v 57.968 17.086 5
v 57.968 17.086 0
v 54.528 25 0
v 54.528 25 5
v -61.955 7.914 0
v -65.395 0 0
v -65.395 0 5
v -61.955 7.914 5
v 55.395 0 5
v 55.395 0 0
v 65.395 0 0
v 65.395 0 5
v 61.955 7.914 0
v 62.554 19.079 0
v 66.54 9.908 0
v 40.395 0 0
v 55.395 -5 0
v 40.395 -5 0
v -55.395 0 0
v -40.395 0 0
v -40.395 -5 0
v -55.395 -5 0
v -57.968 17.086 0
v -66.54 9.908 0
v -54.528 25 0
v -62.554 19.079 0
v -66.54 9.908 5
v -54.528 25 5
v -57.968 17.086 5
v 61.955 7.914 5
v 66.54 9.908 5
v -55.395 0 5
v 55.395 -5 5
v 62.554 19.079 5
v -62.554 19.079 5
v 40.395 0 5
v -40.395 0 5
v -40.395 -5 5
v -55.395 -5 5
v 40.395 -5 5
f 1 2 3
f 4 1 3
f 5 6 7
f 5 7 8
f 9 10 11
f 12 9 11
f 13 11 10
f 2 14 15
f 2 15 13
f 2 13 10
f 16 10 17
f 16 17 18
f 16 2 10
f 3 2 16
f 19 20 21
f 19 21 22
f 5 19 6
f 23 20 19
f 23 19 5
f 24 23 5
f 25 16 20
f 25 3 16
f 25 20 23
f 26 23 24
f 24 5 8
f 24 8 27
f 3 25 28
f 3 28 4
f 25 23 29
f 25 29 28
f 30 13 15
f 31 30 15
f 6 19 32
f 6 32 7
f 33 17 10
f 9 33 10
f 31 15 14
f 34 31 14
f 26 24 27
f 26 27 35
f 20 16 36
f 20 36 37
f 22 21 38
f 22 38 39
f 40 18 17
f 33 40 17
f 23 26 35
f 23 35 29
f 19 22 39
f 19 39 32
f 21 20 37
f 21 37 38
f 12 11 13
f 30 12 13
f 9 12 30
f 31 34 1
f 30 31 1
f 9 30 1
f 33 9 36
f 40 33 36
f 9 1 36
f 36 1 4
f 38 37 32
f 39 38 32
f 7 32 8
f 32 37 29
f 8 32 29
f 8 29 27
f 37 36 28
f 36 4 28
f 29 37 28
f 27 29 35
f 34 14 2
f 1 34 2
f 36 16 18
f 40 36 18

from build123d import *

# Parameters (mm, degrees)
BOSS_EXTRUDE1_DEPTH = 5


with BuildPart() as part:
    # Sketch1 → Boss-Extrude1 (new body)
    with BuildSketch(Plane.XY):
        Polygon((0, 0), (40.395, 0), (40.395, -5), (55.395, -5), (55.395, 0), (65.395, 0), (61.954765166, 7.914471805), (66.540293361, 9.907693111), (62.55385075, 19.078749501), (57.968322555, 17.085528195), (54.528087721, 25), (0, 25), align=None)
    boss_extrude1 = extrude(amount=BOSS_EXTRUDE1_DEPTH)

    # Mirror1: Boss-Extrude1 across plane
    add(boss_extrude1.mirror(Plane(origin=(0, 0, 5), x_dir=(0, 0, 1), z_dir=(1, 0, 0))))


solid = part.part
